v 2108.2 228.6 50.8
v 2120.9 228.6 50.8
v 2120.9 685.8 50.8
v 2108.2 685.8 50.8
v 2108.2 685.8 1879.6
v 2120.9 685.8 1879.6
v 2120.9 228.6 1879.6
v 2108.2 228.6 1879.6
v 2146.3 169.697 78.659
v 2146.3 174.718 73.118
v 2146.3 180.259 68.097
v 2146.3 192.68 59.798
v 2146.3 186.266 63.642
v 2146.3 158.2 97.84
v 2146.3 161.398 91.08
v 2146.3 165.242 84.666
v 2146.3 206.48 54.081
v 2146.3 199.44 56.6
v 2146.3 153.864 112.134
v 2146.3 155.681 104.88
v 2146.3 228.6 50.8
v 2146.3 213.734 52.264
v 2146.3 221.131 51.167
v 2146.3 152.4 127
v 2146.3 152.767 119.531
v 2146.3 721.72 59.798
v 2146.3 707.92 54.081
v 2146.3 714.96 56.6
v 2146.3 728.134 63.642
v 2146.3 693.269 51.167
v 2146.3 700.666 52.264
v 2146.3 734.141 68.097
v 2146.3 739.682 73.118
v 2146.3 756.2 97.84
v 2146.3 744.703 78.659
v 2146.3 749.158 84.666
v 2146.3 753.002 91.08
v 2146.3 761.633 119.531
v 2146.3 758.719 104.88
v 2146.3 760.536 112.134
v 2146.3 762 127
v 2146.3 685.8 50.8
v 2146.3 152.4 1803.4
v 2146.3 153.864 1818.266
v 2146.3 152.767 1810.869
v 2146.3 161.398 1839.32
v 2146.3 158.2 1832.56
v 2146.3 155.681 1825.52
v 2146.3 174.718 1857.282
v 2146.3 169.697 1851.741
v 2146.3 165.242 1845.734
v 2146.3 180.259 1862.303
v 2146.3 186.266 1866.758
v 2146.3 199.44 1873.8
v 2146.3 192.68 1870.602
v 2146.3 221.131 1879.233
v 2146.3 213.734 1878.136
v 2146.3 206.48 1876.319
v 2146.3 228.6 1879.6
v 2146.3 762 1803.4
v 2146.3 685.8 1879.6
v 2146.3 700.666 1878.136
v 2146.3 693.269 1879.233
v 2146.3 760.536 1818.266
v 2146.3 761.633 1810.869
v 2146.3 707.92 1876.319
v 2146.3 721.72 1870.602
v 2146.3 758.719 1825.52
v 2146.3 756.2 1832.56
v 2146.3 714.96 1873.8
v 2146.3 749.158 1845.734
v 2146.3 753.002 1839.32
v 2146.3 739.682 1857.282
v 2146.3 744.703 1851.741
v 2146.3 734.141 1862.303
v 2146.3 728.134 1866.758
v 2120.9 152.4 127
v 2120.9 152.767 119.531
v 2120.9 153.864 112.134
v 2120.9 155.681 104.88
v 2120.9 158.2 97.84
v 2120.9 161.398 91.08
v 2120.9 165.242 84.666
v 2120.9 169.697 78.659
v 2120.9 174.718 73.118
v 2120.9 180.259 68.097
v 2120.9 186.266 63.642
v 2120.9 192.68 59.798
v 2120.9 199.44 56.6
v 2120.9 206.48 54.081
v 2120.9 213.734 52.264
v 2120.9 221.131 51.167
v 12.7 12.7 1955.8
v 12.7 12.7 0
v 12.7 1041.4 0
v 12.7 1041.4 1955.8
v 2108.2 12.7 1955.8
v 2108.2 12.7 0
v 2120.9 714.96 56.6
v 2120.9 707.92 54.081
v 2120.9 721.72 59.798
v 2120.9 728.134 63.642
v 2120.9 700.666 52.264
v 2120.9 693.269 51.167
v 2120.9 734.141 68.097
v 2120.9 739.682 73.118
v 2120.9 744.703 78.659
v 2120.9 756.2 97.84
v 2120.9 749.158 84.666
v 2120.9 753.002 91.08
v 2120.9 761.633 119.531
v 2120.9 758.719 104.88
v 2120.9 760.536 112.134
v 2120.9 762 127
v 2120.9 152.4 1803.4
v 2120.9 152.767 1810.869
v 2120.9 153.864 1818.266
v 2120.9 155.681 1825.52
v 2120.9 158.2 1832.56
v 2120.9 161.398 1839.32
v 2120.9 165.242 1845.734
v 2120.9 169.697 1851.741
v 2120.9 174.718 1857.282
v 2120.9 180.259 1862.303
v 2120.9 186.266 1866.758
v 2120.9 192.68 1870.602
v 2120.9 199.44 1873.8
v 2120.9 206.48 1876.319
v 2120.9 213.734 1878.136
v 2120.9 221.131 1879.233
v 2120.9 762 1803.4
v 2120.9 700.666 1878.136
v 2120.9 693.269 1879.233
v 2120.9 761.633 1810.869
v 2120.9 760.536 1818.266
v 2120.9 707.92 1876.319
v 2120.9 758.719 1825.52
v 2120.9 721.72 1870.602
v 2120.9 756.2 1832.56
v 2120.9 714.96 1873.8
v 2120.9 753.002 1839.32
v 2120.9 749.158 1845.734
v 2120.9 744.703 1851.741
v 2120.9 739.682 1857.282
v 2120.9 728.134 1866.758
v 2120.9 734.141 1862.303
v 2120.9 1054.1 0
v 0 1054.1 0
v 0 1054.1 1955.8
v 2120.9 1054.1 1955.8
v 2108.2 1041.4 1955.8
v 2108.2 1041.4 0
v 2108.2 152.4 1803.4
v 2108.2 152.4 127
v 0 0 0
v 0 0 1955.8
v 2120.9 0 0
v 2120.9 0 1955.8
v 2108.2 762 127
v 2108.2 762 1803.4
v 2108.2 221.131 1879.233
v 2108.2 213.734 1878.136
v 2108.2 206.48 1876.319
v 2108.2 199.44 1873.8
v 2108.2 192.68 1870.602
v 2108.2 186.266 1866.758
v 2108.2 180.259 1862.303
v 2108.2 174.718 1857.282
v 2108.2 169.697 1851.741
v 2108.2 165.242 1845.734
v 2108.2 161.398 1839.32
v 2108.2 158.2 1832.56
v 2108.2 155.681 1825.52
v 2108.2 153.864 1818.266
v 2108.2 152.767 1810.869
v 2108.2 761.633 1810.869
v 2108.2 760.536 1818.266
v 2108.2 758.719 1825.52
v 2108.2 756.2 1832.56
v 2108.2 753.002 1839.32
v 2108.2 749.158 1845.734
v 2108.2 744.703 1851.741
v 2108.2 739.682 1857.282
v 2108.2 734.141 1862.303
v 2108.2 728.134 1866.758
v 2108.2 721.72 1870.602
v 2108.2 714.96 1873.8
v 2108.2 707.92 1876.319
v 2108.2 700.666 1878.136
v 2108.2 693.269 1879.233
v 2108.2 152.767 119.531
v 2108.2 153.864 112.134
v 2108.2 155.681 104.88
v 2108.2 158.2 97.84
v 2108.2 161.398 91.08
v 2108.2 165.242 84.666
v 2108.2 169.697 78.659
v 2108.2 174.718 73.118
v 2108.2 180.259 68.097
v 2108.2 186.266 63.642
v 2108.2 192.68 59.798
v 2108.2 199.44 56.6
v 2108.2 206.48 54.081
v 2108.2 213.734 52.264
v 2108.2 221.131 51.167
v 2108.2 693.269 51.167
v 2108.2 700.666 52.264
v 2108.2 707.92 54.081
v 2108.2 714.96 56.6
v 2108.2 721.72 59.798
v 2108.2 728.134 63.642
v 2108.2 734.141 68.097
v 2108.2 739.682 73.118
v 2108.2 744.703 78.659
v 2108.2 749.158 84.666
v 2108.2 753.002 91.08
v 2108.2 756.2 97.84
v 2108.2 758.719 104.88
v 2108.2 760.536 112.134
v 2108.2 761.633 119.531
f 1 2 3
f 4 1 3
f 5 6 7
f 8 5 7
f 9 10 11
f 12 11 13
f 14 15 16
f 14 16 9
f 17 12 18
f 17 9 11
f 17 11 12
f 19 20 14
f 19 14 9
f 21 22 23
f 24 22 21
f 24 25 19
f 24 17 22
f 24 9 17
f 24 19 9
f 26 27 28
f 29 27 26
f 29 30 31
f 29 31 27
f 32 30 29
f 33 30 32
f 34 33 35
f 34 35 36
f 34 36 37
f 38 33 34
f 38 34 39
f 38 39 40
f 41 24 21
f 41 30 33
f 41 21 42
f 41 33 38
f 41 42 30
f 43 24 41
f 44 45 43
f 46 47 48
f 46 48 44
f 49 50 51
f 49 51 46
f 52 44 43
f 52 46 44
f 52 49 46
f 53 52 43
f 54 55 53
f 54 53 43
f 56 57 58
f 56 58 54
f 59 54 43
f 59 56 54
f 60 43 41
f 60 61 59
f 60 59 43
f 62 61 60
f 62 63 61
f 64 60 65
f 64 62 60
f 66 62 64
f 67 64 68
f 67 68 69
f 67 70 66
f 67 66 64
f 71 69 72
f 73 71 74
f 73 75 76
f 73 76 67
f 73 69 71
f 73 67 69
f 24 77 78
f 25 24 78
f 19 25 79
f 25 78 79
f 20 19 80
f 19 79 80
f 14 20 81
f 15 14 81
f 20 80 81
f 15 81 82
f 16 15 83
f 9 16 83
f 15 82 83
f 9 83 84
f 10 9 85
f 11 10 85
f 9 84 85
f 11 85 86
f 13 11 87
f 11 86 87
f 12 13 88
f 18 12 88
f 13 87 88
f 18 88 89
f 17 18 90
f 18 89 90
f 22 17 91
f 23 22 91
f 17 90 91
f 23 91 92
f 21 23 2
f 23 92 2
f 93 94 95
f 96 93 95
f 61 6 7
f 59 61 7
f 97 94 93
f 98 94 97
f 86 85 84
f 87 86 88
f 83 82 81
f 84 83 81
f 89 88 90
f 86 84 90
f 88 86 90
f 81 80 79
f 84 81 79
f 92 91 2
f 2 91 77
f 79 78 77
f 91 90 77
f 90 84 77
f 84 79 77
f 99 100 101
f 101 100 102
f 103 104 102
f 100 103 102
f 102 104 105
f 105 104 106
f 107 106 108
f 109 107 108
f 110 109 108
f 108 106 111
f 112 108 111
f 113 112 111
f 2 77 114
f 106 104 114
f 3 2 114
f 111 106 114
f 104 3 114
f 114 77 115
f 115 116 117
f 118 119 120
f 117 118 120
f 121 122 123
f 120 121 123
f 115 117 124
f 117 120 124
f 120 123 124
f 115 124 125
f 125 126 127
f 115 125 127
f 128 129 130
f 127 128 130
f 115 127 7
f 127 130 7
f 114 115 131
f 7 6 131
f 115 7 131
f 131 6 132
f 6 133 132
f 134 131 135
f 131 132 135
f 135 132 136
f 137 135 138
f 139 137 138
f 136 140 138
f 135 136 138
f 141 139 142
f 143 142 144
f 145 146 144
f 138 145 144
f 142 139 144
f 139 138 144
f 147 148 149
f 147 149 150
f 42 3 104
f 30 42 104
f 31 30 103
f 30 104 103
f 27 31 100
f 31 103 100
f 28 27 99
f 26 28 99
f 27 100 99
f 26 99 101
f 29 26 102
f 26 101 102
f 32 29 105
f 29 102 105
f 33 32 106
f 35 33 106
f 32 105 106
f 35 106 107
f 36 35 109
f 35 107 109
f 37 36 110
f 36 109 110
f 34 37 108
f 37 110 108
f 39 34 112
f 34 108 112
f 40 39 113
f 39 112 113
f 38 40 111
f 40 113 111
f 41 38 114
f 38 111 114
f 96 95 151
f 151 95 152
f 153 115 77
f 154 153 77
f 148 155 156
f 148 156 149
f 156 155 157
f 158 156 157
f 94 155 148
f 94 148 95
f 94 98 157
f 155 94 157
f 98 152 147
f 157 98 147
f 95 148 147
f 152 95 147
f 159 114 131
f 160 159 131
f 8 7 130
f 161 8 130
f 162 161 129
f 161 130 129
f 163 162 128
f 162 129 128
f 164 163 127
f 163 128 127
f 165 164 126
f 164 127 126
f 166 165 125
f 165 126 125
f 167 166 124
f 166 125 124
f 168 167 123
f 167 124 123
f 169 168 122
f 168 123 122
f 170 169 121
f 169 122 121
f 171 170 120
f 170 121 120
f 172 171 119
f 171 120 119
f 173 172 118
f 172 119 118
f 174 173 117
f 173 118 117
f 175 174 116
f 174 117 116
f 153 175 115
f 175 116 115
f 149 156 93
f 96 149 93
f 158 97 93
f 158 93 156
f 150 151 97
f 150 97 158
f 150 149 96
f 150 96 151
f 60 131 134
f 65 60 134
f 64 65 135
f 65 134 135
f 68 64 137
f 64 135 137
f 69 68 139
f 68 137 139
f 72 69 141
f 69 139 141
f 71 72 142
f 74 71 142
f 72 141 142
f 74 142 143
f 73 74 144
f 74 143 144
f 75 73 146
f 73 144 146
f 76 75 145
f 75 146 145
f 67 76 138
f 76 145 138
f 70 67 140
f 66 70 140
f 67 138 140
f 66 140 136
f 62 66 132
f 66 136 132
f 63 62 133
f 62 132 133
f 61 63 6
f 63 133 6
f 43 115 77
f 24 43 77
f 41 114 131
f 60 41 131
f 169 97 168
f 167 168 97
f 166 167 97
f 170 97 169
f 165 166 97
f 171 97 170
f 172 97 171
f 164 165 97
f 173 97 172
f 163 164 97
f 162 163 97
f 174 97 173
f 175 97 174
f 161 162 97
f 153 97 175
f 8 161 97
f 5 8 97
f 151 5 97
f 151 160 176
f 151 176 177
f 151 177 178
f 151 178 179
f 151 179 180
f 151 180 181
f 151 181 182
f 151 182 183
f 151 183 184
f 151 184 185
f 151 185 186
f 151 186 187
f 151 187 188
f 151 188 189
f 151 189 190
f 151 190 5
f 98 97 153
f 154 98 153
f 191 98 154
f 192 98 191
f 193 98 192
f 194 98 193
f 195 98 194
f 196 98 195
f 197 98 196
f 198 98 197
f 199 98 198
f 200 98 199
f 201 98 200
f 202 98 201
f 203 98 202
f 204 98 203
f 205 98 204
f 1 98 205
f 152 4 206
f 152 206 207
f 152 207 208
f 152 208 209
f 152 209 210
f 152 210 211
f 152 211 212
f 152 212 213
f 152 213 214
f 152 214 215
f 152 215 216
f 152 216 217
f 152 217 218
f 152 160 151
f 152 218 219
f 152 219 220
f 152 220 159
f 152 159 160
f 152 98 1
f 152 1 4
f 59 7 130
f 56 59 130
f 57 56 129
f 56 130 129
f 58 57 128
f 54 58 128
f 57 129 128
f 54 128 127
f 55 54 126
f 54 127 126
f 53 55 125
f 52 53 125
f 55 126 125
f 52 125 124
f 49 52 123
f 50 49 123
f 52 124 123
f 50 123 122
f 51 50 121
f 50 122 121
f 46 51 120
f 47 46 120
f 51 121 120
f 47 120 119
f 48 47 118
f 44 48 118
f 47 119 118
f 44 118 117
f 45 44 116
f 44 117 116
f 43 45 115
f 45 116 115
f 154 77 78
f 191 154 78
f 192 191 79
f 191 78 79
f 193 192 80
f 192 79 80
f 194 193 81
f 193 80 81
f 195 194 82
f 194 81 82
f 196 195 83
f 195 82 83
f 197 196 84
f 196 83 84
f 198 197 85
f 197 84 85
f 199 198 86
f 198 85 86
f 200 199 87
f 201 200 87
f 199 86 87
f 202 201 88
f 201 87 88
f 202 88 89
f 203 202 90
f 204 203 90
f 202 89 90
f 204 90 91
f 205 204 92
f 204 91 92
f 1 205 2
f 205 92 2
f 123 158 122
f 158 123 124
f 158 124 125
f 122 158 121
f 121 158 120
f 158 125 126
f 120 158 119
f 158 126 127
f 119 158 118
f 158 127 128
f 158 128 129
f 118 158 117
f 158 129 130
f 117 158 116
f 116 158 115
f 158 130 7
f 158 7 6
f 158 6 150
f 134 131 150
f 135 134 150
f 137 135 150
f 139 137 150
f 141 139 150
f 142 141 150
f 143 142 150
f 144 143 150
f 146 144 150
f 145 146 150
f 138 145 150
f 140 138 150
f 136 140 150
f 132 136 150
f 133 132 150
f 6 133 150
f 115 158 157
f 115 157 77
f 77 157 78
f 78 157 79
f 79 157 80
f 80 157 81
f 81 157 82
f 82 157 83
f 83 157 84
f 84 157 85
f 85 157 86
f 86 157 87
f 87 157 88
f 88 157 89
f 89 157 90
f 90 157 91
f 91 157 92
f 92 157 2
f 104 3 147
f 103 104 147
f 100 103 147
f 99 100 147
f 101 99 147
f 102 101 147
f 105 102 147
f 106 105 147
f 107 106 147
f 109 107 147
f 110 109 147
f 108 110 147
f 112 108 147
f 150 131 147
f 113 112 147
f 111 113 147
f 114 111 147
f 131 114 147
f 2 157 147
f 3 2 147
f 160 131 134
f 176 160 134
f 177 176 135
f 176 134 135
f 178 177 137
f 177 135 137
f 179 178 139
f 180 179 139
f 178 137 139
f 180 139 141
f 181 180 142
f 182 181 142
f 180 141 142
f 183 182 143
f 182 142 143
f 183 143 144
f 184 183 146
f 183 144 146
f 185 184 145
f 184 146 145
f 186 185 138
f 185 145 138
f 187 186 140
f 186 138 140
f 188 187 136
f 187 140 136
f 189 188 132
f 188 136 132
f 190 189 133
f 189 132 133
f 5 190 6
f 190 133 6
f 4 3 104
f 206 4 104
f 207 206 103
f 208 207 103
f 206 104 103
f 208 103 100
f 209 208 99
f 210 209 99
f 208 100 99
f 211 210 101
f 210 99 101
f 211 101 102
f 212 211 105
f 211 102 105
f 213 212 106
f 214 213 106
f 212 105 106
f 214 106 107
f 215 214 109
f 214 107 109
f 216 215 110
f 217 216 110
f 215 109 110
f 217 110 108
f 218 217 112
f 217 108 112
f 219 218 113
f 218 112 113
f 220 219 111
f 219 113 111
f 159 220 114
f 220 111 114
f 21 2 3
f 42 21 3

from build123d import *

# Parameters (mm, degrees)
F0_W     = 2120.9
F0_H     = 1054.1
F0_W_2   = 2095.5
F0_H_2   = 1028.7
F1_DEPTH = 1955.8
F3_DEPTH = 12.7
F5_DEPTH = 25.4


with BuildPart() as f1:
    # F0 (on Top) → F1 (new body)
    with BuildSketch(Plane.XY):
        with Locations((1060.45, 527.05)):
            Rectangle(F0_W, F0_H)
        with Locations((1060.45, 527.05)):
            Rectangle(F0_W_2, F0_H_2, mode=Mode.SUBTRACT)
    extrude(amount=F1_DEPTH)

    # F2 (on face) → F3 (cut, through all)
    with BuildSketch(Plane.YZ.offset(2120.9)):
        with BuildLine():
            ThreePointArc((152.4, 127), (174.718463, 73.118463), (228.6, 50.8))
            Line((228.6, 50.8), (685.8, 50.8))
            ThreePointArc((685.8, 50.8), (739.681537, 73.118463), (762, 127))
            Line((762, 127), (762, 1803.4))
            ThreePointArc((762, 1803.4), (739.681537, 1857.281537), (685.8, 1879.6))
            Line((685.8, 1879.6), (228.6, 1879.6))
            ThreePointArc((228.6, 1879.6), (174.718463, 1857.281537), (152.4, 1803.4))
            Line((152.4, 1803.4), (152.4, 127))
        make_face()
    extrude(amount=-F3_DEPTH, mode=Mode.SUBTRACT)


with BuildPart() as f5:
    # F4 (on face) → F5 (new body)
    with BuildSketch(Plane.YZ.offset(2120.9)):
        with BuildLine():
            ThreePointArc((228.6, 1879.6), (174.718463, 1857.281537), (152.4, 1803.4))
            Line((152.4, 1803.4), (152.4, 127))
            ThreePointArc((152.4, 127), (174.718463, 73.118463), (228.6, 50.8))
            Line((228.6, 50.8), (685.8, 50.8))
            ThreePointArc((685.8, 50.8), (739.681537, 73.118463), (762, 127))
            Line((762, 127), (762, 1803.4))
            ThreePointArc((762, 1803.4), (739.681537, 1857.281537), (685.8, 1879.6))
            Line((685.8, 1879.6), (228.6, 1879.6))
        make_face()
    extrude(amount=F5_DEPTH)


solid = Compound([f1.part, f5.part])
